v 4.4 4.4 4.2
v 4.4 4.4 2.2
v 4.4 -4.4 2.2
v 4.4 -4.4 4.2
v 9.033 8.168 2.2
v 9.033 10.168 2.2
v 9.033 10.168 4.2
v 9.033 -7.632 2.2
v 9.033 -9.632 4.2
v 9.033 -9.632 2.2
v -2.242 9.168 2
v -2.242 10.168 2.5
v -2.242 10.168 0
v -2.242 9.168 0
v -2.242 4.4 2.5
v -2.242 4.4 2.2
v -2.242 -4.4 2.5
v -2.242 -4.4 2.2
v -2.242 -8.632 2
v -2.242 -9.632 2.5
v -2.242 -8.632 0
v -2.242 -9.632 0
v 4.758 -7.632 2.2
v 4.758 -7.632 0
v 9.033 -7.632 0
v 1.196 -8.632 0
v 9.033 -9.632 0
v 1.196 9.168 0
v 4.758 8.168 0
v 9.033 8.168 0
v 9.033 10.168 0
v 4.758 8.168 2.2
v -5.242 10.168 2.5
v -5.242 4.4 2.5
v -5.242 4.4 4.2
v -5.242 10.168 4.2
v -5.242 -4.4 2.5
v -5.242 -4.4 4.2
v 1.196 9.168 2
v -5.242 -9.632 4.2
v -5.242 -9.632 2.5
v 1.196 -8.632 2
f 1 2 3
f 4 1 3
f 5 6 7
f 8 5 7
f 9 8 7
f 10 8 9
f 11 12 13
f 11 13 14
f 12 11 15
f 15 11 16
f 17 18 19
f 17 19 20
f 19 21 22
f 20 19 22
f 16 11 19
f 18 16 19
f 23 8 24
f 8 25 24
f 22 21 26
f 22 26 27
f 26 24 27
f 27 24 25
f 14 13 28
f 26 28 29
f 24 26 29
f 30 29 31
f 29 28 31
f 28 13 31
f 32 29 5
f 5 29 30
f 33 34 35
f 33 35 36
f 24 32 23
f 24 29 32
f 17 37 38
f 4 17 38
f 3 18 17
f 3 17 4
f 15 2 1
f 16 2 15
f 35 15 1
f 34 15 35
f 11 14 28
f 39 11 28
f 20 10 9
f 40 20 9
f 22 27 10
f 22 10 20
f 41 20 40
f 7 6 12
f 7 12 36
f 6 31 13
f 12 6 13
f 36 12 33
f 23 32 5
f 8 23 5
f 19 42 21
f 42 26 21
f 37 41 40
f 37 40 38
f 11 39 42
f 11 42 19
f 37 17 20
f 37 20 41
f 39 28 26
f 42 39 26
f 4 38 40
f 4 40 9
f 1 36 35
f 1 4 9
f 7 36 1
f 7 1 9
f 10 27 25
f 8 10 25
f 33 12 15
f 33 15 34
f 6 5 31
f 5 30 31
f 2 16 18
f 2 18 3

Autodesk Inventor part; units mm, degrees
ref_plane "YZ Plane" through (0, 0, 0) normal (1, 0, 0) x (0, 1, 0)
ref_plane "XZ Plane" through (0, 0, 0) normal (0, 1, 0) x (-1, 0, 0)
ref_plane "Arbeitsebene1" through (0, 0, 0) normal (0, 0, 1) x (1, 0, 0)
sketch "Skizze1" plane through (0, 0, 0) normal (0, 0, 1) x (1, 0, 0)
  circle A0 centre (-0.0001, 0.0021) radius 3 projected
  circle A1 centre (11, 0) radius 2.566 projected
  circle A2 centre (-9.5, -11) radius 1.352 projected
  arc A3 (19, -13.5) -> (20, -12.5) centre (19, -12.5) ccw projected
  line L0 (20, -12.5) -> (20, 12.5) projected
  arc A4 (20, 12.5) -> (19, 13.5) centre (19, 12.5) ccw projected
  line L1 (19, 13.5) -> (-19, 13.5) projected
  arc A5 (-19, 13.5) -> (-20, 12.5) centre (-19, 12.5) ccw projected
  line L2 (-20, 12.5) -> (-20, -12.5) projected
  arc A6 (-20, -12.5) -> (-19, -13.5) centre (-19, -12.5) ccw projected
  line L3 (-19, -13.5) -> (19, -13.5) projected
  line L4 (18.6579, -7.132) -> (11.0758, -7.132) projected
  line L5 (18.6579, -7.132) -> (18.6579, 2.268) projected
  line L6 (18.6579, 2.268) -> (19.6579, 4.268) projected
  line L7 (19.6579, 4.268) -> (19.6579, 7.668) projected
  line L8 (18.0704, 7.668) -> (19.6579, 7.668) projected
  line L9 (18.0704, 7.668) -> (18.0704, 6.818) projected
  line L10 (18.0704, 6.818) -> (13.4704, 6.818) projected
  line L11 (13.4704, 6.818) -> (13.4704, 5.418) projected
  line L12 (13.4704, 5.418) -> (14.8704, 5.418) projected
  line L13 (14.8704, 5.418) -> (15.4704, 6.018) projected
  line L14 (15.4704, 6.018) -> (18.0704, 6.018) projected
  line L15 (18.0704, 6.018) -> (18.0704, 5.768) projected
  line L16 (18.0704, 5.768) -> (15.5704, 5.768) projected
  line L17 (15.5704, 5.768) -> (15.0704, 5.268) projected
  line L18 (15.0704, 5.268) -> (13.0704, 5.268) projected
  line L19 (13.0704, 5.268) -> (13.0704, 7.668) projected
  line L20 (6.4079, 7.668) -> (13.0704, 7.668) projected
  line L21 (6.4079, 7.668) -> (6.4079, 6.468) projected
  line L22 (4.7579, 6.468) -> (6.4079, 6.468) projected
  line L23 (4.7579, -7.132) -> (4.7579, 6.468) projected
  line L24 (5.4458, -7.132) -> (4.7579, -7.132) projected
  line L25 (5.4458, -7.132) -> (5.4458, -6.382) projected
  line L26 (5.4458, -6.382) -> (11.0758, -6.382) projected
  line L27 (11.0758, -6.382) -> (11.0758, -7.132) projected
  line L28 (9.0327, 10.168) -> (-5.2421, 10.168)
  line L29 (-5.2421, 10.168) -> (-5.2421, 8.168)
  line L30 (-5.2421, 8.168) -> (9.0327, 8.168)
  line L31 (9.0327, 8.168) -> (9.0327, 10.168)
  line L32 (-5.2421, 8.168) -> (4.7579, 8.168)
  line L33 (4.7579, 8.168) -> (4.7579, -9.632)
  line L34 (4.7579, -9.632) -> (-5.2421, -9.632)
  line L35 (-5.2421, -9.632) -> (-5.2421, 8.168)
  line L36 (4.7579, -9.632) -> (9.0327, -9.632)
  line L37 (9.0327, -9.632) -> (9.0327, -7.632)
  line L38 (9.0327, -7.632) -> (4.7579, -7.632)
  line L39 (4.7579, -7.632) -> (4.7579, -9.632)
  point P0 (0, 0)
  point P1 (4.7579, 8.168)
  dimension "d0" = 0
  dimension "d1" = 0.5
  dimension "d2" = 0.5
  dimension "d3" = 2
  dimension "d4" = 2
  dimension "d5" = 10
ref_plane "Arbeitsebene2" through (4.7579, -7.132, 2.2) normal (0, 0, 1) x (1, 0, 0)
extrude "Extrusion1" add sketch "Skizze1" along normal up to surface (2.2 mm away) contours A0 | L33 L34 L35 L30 L23 | L38 L37 L36 L33 | L30 L29 L28 L31
sketch "Skizze2" plane through (-5.2421, 10.168, 2.2) normal (0, 0, 1) x (1, 0, 0)
  line L0 (0, 0) -> (14.2747, 0) projected
  line L1 (0, -19.8) -> (0, 0) projected
  line L2 (14.2747, -19.8) -> (0, -19.8) projected
  line L3 (14.2747, -17.8) -> (14.2747, -19.8) projected
  line L4 (10, -17.8) -> (14.2747, -17.8) projected
  line L5 (10, -2) -> (10, -17.8) projected
  line L6 (14.2747, -2) -> (10, -2) projected
  line L7 (14.2747, 0) -> (14.2747, -2) projected
  line L8 (14.2747, 0) -> (0, 0) projected
  line L9 (14.2747, 0) -> (0, 0)
  line L10 (0, 0) -> (0, -19.8)
  line L11 (0, -19.8) -> (14.2747, -19.8)
  line L12 (14.2747, -19.8) -> (14.2747, 0)
  line L13 (9.6421, -14.568) -> (0.8421, -14.568)
  line L14 (0.8421, -14.568) -> (0.8421, -5.768)
  line L15 (0.8421, -5.768) -> (9.6421, -5.768)
  line L16 (9.6421, -5.768) -> (9.6421, -14.568)
  line L17 (9.6421, -14.568) -> (0.8421, -5.768) construction
  line L18 (0.8421, -14.568) -> (9.6421, -5.768) construction
  line L19 (0, 0) -> (0, -19.8) projected
  line L20 (0.8421, -5.768) -> (0, -5.768)
  line L21 (0, -5.768) -> (0, -14.568)
  line L22 (0, -14.568) -> (0.8421, -14.568)
  line L23 (0.8421, -14.568) -> (0.8421, -5.768)
  point P0 (5.2421, -10.168)
  point P1 (0, -5.768)
  point P2 (0.8421, -14.568)
  point P3 (14.2747, -17.8)
  point P4 (14.2747, -2)
  dimension "d8" = 8.8
  dimension "d9" = 8.8
extrude "Extrusion2" add sketch "Skizze2" along normal blind 2 contours L0 L7 L6 L5 L4 L3 L2 L1 L22 L13 L16 L15 L20 | L12 L4 L5 L6
sketch "Skizze3" plane through (0, 0, 0) normal (0, 0, -1) x (-1, 0, 0)
  line L0 (5.2421, 10.168) -> (5.2421, -9.632) projected
  line L1 (-9.0327, 10.168) -> (5.2421, 10.168) projected
  line L2 (-9.0327, 8.168) -> (-9.0327, 10.168) projected
  line L3 (-4.7579, 8.168) -> (-9.0327, 8.168) projected
  line L4 (-4.7579, -7.632) -> (-4.7579, 8.168) projected
  line L5 (-9.0327, -7.632) -> (-4.7579, -7.632) projected
  line L6 (-9.0327, -9.632) -> (-9.0327, -7.632) projected
  line L7 (5.2421, -9.632) -> (-9.0327, -9.632) projected
  line L8 (2.2421, -9.8367) -> (9.0217, -9.8367)
  line L9 (9.0217, -9.8367) -> (9.0217, 10.4786)
  line L10 (9.0217, 10.4786) -> (2.2421, 10.4786)
  line L11 (2.2421, 10.4786) -> (2.2421, -9.8367)
  line L12 (2.2421, -9.8367) -> (9.0217, 10.4786) construction
  line L13 (9.0217, -9.8367) -> (2.2421, 10.4786) construction
  point P0 (0, 0)
  point P1 (5.6319, 0.321)
  dimension "d12" = 3
extrude "Extrusion3" cut sketch "Skizze3" against normal blind 2.5 contours L1 L11 L10 L9 L8 L7 L0 | L0 L7 L11 L1
sketch "Skizze4" plane through (0, 0, 0) normal (0, 0, -1) x (-1, 0, 0)
  line L0 (2.2421, -9.632) -> (2.2421, 10.168) projected
  line L1 (-9.0327, 10.168) -> (2.2421, 10.168) projected
  line L2 (-9.0327, 8.168) -> (-9.0327, 10.168) projected
  line L3 (-4.7579, 8.168) -> (-9.0327, 8.168) projected
  line L4 (-4.7579, -7.632) -> (-4.7579, 8.168) projected
  line L5 (-9.0327, -7.632) -> (-4.7579, -7.632) projected
  line L6 (-9.0327, -9.632) -> (-9.0327, -7.632) projected
  line L7 (2.2421, -9.632) -> (-9.0327, -9.632) projected
  line L8 (2.2421, 4.4) -> (2.2421, 10.168) projected
  line L9 (2.2421, 9.168) -> (-1.1963, 9.168)
  line L10 (-1.1963, 9.168) -> (-1.1963, -8.632)
  line L11 (-1.1963, -8.632) -> (2.2421, -8.632)
  line L12 (2.2421, -8.632) -> (2.2421, 9.168)
  point P0 (0, 0)
  point P1 (2.2421, -8.632)
extrude "Extrusion4" cut sketch "Skizze4" against normal blind 2 contours L11 L10 L9 L0
equation "\"d6\" = d2"
properties part number "Anglerfish_Cameraspacer"
